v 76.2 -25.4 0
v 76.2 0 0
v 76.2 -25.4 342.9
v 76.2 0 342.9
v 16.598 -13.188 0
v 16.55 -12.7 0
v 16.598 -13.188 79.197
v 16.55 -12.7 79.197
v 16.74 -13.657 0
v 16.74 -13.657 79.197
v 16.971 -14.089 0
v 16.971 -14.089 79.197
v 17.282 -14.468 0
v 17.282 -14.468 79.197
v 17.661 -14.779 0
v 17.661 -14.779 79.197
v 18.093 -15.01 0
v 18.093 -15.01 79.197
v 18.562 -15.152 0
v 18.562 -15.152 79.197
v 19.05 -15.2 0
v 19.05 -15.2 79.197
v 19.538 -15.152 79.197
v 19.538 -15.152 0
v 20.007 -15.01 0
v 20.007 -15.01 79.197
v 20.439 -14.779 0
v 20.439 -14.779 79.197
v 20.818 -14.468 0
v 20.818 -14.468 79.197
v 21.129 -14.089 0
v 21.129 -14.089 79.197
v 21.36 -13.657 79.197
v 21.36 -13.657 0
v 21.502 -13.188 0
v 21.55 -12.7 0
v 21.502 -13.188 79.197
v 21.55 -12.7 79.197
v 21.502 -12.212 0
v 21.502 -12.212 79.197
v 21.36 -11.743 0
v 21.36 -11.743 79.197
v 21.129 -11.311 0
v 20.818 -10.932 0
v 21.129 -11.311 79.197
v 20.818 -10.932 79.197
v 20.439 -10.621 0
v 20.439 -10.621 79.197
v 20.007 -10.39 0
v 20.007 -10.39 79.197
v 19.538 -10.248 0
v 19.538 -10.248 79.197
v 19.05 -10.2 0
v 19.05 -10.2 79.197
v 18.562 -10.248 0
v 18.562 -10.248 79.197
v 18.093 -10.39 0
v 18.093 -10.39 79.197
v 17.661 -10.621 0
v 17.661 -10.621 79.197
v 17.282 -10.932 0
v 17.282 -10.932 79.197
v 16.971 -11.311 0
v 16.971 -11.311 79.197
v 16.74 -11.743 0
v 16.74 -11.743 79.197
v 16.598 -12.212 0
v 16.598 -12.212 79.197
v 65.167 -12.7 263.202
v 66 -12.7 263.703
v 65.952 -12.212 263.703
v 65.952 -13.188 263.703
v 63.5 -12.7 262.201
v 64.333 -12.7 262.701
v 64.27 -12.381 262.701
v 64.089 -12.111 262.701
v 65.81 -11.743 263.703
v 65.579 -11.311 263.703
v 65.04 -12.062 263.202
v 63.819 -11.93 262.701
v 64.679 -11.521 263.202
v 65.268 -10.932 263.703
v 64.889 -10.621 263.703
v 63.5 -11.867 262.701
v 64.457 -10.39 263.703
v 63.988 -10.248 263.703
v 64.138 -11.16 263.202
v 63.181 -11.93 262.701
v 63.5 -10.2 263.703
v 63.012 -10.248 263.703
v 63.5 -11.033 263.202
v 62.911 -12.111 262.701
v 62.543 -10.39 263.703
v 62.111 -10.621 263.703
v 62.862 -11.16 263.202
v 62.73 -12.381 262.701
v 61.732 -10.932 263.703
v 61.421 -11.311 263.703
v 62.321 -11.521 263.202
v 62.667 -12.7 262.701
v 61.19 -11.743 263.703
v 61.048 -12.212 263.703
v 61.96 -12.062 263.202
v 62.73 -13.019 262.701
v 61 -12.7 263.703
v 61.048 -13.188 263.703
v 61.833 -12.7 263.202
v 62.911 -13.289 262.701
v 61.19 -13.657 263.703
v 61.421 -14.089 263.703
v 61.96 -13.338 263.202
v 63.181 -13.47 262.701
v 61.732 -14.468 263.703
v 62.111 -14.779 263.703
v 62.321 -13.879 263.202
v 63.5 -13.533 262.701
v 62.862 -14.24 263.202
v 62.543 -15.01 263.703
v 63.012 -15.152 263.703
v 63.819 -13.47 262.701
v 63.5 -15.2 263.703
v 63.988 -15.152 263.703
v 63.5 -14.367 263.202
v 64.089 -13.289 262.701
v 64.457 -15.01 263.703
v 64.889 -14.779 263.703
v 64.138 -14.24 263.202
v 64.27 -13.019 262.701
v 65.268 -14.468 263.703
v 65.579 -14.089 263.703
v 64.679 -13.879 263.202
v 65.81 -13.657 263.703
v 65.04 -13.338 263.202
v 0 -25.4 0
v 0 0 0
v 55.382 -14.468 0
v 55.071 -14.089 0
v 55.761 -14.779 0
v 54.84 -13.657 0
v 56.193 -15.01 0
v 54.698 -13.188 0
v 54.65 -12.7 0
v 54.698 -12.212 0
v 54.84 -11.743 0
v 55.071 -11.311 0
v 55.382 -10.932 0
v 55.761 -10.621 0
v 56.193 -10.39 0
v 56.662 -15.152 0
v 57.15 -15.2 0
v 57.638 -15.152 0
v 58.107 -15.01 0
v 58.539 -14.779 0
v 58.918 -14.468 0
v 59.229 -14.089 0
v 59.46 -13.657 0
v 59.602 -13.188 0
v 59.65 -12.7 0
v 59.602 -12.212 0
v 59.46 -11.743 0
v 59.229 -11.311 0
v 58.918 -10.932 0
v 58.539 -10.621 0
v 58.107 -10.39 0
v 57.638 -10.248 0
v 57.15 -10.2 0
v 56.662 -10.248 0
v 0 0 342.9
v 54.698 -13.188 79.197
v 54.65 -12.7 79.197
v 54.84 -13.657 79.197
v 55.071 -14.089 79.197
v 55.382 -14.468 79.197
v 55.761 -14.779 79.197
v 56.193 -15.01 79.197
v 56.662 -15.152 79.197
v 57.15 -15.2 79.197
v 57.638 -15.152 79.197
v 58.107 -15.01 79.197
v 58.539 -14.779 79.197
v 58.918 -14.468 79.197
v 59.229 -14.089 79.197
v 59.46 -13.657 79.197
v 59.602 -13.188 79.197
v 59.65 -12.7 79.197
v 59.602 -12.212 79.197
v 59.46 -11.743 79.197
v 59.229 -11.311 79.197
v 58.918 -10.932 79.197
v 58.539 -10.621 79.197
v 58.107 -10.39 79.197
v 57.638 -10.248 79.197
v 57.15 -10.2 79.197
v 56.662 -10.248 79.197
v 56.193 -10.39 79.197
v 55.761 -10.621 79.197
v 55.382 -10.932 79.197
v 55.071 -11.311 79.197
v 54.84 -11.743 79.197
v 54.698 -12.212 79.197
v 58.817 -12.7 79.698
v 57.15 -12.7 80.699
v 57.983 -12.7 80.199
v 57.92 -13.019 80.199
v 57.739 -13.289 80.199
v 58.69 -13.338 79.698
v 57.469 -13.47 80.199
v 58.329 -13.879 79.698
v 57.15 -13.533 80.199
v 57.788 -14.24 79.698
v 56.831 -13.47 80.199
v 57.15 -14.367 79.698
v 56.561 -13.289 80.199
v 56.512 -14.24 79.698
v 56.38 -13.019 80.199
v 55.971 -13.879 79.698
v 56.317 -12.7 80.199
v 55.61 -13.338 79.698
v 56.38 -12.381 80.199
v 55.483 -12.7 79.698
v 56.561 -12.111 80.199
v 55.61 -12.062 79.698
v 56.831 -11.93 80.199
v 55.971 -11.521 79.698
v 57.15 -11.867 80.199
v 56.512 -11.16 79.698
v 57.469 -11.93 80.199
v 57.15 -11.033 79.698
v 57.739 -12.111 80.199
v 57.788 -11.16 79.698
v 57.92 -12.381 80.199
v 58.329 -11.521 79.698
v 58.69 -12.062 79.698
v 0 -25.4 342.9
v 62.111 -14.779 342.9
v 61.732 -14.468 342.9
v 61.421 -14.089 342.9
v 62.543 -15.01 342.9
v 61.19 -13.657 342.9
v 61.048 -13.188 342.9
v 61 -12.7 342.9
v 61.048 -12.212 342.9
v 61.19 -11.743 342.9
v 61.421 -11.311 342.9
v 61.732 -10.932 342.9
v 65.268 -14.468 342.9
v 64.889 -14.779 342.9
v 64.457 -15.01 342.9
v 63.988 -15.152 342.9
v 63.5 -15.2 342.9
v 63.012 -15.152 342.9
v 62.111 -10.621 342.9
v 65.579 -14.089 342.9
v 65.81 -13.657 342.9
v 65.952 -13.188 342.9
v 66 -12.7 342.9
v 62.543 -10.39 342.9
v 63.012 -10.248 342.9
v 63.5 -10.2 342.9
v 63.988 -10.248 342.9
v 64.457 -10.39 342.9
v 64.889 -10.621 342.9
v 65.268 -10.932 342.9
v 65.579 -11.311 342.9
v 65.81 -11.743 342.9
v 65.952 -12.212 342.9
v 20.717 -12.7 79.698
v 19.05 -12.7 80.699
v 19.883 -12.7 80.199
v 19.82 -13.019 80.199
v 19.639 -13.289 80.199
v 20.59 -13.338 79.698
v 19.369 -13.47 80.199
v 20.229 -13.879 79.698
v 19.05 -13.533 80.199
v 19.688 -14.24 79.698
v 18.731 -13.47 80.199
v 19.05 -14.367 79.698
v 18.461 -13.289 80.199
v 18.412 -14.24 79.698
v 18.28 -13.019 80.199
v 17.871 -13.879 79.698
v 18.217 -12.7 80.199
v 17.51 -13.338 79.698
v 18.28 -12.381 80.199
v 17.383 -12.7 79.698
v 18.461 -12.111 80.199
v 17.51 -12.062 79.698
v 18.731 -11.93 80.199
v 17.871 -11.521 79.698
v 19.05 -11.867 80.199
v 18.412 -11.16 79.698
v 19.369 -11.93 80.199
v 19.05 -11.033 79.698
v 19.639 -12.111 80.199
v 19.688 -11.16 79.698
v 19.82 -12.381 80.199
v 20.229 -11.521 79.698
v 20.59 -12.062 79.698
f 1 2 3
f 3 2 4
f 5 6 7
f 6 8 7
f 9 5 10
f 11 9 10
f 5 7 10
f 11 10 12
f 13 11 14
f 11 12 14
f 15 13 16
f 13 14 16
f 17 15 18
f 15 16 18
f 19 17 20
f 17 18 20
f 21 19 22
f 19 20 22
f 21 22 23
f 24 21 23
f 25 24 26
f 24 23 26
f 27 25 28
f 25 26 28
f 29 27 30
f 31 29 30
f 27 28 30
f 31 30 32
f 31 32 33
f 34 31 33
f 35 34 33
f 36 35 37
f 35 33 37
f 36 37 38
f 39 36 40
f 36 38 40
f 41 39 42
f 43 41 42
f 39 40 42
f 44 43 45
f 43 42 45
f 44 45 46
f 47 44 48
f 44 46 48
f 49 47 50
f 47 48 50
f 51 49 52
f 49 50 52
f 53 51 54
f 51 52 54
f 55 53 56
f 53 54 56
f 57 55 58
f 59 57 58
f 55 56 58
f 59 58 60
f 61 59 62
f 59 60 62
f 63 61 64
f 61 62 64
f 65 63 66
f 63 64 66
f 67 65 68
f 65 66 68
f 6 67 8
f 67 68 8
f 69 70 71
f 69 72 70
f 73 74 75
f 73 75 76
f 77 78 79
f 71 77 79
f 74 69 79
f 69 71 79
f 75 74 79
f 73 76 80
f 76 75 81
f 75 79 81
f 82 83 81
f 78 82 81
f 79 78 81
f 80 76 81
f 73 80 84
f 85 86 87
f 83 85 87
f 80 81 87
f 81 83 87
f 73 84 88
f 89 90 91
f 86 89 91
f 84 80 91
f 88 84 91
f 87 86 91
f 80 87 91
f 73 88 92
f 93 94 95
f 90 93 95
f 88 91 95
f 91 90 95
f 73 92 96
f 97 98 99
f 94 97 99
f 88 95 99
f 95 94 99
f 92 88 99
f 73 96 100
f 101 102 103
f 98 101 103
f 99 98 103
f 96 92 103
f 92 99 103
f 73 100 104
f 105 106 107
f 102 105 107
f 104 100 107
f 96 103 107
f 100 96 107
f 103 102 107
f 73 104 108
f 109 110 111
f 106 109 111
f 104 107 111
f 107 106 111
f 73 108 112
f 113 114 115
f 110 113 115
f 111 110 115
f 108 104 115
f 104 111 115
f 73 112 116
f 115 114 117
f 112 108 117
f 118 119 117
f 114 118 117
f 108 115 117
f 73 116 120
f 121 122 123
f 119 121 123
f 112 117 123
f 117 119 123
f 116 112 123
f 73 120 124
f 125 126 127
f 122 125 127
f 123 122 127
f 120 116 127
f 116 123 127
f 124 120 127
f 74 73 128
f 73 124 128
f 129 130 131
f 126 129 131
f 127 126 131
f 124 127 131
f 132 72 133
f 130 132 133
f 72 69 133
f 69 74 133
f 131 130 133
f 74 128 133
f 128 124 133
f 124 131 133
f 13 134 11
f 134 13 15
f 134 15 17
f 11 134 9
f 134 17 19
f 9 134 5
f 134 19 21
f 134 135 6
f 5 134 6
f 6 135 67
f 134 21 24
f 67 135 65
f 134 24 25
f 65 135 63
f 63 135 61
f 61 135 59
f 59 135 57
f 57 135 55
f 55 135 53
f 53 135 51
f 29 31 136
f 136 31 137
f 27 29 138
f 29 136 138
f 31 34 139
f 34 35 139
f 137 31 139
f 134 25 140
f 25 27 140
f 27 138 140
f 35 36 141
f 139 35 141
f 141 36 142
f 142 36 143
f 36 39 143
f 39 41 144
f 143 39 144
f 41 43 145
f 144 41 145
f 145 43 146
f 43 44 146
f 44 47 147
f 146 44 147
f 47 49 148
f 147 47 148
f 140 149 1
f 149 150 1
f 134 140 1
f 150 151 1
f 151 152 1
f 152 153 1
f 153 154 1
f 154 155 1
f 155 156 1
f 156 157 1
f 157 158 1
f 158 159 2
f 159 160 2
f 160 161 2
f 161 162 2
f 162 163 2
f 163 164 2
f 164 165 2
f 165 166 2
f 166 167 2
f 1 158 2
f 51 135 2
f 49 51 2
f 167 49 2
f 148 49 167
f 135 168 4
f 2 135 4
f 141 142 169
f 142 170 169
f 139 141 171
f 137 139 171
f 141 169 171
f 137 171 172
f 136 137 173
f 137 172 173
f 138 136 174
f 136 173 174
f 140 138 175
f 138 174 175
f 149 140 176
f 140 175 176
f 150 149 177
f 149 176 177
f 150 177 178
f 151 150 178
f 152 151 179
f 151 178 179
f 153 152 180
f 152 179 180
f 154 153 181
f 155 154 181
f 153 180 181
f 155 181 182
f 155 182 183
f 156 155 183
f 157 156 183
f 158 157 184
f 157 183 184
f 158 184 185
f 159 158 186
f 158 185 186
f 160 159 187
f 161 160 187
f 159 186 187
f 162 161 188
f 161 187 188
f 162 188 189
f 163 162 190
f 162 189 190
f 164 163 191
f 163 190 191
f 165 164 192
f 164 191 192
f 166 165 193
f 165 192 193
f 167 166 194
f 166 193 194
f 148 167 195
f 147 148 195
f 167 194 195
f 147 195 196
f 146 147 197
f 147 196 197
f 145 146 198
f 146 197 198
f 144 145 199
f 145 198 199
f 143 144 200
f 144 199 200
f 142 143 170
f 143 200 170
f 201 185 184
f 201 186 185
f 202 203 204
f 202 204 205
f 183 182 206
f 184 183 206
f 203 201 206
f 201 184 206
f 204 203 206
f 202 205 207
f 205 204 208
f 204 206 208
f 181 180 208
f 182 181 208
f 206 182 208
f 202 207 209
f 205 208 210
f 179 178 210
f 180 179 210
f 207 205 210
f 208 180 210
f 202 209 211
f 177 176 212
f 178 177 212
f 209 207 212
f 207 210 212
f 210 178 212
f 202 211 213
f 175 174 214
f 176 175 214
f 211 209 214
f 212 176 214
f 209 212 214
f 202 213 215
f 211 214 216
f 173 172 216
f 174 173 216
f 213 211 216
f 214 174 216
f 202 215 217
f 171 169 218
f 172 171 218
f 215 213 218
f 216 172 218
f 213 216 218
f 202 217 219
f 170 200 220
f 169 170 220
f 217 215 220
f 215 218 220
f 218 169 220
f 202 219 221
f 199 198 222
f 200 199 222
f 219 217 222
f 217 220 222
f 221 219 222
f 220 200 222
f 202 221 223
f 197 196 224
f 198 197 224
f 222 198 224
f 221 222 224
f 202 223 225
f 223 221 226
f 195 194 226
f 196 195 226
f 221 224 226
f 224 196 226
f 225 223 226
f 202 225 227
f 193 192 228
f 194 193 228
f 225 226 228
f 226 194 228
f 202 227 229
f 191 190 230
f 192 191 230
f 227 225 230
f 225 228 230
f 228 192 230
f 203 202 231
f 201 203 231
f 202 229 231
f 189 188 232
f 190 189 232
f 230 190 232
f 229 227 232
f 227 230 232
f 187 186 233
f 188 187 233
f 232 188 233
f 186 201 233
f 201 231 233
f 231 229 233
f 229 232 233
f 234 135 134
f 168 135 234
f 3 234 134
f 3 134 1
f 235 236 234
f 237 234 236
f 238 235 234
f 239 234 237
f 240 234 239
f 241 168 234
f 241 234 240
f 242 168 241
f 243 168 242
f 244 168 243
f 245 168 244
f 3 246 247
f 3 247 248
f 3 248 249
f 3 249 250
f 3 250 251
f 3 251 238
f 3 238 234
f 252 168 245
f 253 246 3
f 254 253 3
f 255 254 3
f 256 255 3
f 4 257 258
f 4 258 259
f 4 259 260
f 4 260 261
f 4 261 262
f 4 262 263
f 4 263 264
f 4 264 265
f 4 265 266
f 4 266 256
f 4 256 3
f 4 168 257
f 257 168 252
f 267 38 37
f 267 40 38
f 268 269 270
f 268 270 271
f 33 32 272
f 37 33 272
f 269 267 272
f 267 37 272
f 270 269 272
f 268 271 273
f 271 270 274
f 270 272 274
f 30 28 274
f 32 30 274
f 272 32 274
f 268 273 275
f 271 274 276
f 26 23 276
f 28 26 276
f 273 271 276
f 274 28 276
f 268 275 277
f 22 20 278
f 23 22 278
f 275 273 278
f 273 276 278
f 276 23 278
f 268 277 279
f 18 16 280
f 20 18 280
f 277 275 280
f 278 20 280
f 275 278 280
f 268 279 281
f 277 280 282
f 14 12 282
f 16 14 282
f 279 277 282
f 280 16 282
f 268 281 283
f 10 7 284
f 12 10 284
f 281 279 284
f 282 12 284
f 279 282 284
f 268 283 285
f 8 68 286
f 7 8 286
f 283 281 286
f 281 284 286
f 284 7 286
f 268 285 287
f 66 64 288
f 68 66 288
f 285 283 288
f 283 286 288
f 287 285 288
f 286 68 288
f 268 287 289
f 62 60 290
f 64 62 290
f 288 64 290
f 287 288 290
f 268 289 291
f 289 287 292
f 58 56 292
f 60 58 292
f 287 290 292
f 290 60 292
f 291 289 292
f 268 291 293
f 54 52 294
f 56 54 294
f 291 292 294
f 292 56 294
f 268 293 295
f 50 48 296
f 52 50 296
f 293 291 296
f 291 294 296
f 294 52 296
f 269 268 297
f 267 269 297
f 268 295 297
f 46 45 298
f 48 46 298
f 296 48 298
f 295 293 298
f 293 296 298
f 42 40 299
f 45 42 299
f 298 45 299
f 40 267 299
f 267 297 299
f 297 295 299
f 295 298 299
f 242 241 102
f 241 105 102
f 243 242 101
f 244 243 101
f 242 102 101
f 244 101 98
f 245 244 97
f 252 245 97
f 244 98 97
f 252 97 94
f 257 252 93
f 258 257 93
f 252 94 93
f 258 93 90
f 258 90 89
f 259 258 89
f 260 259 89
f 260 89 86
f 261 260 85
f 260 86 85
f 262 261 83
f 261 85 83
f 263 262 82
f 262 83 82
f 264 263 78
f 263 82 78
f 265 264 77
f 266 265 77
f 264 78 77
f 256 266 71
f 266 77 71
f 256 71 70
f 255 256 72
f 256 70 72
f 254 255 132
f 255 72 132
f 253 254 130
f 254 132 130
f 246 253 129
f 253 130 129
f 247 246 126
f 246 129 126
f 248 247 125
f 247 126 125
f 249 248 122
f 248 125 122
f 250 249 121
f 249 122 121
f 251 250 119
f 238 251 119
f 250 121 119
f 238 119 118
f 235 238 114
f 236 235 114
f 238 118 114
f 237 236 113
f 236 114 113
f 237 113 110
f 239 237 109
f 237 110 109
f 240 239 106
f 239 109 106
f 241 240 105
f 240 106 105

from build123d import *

# Parameters (mm, degrees)
F0_W     = 76.2
F0_H     = 342.9
F1_DEPTH = 25.4
F3_D     = 5
F3_DEPTH = 79.1972
F3_TIP   = 1.5021515476
F5_D     = 5
F5_DEPTH = 79.1972
F5_TIP   = 1.5021515476


with BuildPart() as f1:
    # F0 (on Front) → F1 (new body)
    with BuildSketch(Plane.XZ):
        with Locations((38.1, 171.45)):
            Rectangle(F0_W, F0_H)
    extrude(amount=F1_DEPTH)

    # F3
    with Locations(Plane.XY.offset(342.9)):
        with Locations((63.5, -12.7)):
            Hole(F3_D / 2, depth=F3_DEPTH)
            with Locations((0, 0, -(F3_DEPTH + F3_TIP / 2))):  # 118° drill point
                Cone(0, F3_D / 2, F3_TIP, mode=Mode.SUBTRACT)

    # F5
    with Locations(Plane(origin=(0, 0, 0), x_dir=(1, 0, 0), z_dir=(0, 0, -1))):
        with Locations((57.15, 12.7), (19.05, 12.7)):
            Hole(F5_D / 2, depth=F5_DEPTH)
            with Locations((0, 0, -(F5_DEPTH + F5_TIP / 2))):  # 118° drill point
                Cone(0, F5_D / 2, F5_TIP, mode=Mode.SUBTRACT)


solid = f1.part
